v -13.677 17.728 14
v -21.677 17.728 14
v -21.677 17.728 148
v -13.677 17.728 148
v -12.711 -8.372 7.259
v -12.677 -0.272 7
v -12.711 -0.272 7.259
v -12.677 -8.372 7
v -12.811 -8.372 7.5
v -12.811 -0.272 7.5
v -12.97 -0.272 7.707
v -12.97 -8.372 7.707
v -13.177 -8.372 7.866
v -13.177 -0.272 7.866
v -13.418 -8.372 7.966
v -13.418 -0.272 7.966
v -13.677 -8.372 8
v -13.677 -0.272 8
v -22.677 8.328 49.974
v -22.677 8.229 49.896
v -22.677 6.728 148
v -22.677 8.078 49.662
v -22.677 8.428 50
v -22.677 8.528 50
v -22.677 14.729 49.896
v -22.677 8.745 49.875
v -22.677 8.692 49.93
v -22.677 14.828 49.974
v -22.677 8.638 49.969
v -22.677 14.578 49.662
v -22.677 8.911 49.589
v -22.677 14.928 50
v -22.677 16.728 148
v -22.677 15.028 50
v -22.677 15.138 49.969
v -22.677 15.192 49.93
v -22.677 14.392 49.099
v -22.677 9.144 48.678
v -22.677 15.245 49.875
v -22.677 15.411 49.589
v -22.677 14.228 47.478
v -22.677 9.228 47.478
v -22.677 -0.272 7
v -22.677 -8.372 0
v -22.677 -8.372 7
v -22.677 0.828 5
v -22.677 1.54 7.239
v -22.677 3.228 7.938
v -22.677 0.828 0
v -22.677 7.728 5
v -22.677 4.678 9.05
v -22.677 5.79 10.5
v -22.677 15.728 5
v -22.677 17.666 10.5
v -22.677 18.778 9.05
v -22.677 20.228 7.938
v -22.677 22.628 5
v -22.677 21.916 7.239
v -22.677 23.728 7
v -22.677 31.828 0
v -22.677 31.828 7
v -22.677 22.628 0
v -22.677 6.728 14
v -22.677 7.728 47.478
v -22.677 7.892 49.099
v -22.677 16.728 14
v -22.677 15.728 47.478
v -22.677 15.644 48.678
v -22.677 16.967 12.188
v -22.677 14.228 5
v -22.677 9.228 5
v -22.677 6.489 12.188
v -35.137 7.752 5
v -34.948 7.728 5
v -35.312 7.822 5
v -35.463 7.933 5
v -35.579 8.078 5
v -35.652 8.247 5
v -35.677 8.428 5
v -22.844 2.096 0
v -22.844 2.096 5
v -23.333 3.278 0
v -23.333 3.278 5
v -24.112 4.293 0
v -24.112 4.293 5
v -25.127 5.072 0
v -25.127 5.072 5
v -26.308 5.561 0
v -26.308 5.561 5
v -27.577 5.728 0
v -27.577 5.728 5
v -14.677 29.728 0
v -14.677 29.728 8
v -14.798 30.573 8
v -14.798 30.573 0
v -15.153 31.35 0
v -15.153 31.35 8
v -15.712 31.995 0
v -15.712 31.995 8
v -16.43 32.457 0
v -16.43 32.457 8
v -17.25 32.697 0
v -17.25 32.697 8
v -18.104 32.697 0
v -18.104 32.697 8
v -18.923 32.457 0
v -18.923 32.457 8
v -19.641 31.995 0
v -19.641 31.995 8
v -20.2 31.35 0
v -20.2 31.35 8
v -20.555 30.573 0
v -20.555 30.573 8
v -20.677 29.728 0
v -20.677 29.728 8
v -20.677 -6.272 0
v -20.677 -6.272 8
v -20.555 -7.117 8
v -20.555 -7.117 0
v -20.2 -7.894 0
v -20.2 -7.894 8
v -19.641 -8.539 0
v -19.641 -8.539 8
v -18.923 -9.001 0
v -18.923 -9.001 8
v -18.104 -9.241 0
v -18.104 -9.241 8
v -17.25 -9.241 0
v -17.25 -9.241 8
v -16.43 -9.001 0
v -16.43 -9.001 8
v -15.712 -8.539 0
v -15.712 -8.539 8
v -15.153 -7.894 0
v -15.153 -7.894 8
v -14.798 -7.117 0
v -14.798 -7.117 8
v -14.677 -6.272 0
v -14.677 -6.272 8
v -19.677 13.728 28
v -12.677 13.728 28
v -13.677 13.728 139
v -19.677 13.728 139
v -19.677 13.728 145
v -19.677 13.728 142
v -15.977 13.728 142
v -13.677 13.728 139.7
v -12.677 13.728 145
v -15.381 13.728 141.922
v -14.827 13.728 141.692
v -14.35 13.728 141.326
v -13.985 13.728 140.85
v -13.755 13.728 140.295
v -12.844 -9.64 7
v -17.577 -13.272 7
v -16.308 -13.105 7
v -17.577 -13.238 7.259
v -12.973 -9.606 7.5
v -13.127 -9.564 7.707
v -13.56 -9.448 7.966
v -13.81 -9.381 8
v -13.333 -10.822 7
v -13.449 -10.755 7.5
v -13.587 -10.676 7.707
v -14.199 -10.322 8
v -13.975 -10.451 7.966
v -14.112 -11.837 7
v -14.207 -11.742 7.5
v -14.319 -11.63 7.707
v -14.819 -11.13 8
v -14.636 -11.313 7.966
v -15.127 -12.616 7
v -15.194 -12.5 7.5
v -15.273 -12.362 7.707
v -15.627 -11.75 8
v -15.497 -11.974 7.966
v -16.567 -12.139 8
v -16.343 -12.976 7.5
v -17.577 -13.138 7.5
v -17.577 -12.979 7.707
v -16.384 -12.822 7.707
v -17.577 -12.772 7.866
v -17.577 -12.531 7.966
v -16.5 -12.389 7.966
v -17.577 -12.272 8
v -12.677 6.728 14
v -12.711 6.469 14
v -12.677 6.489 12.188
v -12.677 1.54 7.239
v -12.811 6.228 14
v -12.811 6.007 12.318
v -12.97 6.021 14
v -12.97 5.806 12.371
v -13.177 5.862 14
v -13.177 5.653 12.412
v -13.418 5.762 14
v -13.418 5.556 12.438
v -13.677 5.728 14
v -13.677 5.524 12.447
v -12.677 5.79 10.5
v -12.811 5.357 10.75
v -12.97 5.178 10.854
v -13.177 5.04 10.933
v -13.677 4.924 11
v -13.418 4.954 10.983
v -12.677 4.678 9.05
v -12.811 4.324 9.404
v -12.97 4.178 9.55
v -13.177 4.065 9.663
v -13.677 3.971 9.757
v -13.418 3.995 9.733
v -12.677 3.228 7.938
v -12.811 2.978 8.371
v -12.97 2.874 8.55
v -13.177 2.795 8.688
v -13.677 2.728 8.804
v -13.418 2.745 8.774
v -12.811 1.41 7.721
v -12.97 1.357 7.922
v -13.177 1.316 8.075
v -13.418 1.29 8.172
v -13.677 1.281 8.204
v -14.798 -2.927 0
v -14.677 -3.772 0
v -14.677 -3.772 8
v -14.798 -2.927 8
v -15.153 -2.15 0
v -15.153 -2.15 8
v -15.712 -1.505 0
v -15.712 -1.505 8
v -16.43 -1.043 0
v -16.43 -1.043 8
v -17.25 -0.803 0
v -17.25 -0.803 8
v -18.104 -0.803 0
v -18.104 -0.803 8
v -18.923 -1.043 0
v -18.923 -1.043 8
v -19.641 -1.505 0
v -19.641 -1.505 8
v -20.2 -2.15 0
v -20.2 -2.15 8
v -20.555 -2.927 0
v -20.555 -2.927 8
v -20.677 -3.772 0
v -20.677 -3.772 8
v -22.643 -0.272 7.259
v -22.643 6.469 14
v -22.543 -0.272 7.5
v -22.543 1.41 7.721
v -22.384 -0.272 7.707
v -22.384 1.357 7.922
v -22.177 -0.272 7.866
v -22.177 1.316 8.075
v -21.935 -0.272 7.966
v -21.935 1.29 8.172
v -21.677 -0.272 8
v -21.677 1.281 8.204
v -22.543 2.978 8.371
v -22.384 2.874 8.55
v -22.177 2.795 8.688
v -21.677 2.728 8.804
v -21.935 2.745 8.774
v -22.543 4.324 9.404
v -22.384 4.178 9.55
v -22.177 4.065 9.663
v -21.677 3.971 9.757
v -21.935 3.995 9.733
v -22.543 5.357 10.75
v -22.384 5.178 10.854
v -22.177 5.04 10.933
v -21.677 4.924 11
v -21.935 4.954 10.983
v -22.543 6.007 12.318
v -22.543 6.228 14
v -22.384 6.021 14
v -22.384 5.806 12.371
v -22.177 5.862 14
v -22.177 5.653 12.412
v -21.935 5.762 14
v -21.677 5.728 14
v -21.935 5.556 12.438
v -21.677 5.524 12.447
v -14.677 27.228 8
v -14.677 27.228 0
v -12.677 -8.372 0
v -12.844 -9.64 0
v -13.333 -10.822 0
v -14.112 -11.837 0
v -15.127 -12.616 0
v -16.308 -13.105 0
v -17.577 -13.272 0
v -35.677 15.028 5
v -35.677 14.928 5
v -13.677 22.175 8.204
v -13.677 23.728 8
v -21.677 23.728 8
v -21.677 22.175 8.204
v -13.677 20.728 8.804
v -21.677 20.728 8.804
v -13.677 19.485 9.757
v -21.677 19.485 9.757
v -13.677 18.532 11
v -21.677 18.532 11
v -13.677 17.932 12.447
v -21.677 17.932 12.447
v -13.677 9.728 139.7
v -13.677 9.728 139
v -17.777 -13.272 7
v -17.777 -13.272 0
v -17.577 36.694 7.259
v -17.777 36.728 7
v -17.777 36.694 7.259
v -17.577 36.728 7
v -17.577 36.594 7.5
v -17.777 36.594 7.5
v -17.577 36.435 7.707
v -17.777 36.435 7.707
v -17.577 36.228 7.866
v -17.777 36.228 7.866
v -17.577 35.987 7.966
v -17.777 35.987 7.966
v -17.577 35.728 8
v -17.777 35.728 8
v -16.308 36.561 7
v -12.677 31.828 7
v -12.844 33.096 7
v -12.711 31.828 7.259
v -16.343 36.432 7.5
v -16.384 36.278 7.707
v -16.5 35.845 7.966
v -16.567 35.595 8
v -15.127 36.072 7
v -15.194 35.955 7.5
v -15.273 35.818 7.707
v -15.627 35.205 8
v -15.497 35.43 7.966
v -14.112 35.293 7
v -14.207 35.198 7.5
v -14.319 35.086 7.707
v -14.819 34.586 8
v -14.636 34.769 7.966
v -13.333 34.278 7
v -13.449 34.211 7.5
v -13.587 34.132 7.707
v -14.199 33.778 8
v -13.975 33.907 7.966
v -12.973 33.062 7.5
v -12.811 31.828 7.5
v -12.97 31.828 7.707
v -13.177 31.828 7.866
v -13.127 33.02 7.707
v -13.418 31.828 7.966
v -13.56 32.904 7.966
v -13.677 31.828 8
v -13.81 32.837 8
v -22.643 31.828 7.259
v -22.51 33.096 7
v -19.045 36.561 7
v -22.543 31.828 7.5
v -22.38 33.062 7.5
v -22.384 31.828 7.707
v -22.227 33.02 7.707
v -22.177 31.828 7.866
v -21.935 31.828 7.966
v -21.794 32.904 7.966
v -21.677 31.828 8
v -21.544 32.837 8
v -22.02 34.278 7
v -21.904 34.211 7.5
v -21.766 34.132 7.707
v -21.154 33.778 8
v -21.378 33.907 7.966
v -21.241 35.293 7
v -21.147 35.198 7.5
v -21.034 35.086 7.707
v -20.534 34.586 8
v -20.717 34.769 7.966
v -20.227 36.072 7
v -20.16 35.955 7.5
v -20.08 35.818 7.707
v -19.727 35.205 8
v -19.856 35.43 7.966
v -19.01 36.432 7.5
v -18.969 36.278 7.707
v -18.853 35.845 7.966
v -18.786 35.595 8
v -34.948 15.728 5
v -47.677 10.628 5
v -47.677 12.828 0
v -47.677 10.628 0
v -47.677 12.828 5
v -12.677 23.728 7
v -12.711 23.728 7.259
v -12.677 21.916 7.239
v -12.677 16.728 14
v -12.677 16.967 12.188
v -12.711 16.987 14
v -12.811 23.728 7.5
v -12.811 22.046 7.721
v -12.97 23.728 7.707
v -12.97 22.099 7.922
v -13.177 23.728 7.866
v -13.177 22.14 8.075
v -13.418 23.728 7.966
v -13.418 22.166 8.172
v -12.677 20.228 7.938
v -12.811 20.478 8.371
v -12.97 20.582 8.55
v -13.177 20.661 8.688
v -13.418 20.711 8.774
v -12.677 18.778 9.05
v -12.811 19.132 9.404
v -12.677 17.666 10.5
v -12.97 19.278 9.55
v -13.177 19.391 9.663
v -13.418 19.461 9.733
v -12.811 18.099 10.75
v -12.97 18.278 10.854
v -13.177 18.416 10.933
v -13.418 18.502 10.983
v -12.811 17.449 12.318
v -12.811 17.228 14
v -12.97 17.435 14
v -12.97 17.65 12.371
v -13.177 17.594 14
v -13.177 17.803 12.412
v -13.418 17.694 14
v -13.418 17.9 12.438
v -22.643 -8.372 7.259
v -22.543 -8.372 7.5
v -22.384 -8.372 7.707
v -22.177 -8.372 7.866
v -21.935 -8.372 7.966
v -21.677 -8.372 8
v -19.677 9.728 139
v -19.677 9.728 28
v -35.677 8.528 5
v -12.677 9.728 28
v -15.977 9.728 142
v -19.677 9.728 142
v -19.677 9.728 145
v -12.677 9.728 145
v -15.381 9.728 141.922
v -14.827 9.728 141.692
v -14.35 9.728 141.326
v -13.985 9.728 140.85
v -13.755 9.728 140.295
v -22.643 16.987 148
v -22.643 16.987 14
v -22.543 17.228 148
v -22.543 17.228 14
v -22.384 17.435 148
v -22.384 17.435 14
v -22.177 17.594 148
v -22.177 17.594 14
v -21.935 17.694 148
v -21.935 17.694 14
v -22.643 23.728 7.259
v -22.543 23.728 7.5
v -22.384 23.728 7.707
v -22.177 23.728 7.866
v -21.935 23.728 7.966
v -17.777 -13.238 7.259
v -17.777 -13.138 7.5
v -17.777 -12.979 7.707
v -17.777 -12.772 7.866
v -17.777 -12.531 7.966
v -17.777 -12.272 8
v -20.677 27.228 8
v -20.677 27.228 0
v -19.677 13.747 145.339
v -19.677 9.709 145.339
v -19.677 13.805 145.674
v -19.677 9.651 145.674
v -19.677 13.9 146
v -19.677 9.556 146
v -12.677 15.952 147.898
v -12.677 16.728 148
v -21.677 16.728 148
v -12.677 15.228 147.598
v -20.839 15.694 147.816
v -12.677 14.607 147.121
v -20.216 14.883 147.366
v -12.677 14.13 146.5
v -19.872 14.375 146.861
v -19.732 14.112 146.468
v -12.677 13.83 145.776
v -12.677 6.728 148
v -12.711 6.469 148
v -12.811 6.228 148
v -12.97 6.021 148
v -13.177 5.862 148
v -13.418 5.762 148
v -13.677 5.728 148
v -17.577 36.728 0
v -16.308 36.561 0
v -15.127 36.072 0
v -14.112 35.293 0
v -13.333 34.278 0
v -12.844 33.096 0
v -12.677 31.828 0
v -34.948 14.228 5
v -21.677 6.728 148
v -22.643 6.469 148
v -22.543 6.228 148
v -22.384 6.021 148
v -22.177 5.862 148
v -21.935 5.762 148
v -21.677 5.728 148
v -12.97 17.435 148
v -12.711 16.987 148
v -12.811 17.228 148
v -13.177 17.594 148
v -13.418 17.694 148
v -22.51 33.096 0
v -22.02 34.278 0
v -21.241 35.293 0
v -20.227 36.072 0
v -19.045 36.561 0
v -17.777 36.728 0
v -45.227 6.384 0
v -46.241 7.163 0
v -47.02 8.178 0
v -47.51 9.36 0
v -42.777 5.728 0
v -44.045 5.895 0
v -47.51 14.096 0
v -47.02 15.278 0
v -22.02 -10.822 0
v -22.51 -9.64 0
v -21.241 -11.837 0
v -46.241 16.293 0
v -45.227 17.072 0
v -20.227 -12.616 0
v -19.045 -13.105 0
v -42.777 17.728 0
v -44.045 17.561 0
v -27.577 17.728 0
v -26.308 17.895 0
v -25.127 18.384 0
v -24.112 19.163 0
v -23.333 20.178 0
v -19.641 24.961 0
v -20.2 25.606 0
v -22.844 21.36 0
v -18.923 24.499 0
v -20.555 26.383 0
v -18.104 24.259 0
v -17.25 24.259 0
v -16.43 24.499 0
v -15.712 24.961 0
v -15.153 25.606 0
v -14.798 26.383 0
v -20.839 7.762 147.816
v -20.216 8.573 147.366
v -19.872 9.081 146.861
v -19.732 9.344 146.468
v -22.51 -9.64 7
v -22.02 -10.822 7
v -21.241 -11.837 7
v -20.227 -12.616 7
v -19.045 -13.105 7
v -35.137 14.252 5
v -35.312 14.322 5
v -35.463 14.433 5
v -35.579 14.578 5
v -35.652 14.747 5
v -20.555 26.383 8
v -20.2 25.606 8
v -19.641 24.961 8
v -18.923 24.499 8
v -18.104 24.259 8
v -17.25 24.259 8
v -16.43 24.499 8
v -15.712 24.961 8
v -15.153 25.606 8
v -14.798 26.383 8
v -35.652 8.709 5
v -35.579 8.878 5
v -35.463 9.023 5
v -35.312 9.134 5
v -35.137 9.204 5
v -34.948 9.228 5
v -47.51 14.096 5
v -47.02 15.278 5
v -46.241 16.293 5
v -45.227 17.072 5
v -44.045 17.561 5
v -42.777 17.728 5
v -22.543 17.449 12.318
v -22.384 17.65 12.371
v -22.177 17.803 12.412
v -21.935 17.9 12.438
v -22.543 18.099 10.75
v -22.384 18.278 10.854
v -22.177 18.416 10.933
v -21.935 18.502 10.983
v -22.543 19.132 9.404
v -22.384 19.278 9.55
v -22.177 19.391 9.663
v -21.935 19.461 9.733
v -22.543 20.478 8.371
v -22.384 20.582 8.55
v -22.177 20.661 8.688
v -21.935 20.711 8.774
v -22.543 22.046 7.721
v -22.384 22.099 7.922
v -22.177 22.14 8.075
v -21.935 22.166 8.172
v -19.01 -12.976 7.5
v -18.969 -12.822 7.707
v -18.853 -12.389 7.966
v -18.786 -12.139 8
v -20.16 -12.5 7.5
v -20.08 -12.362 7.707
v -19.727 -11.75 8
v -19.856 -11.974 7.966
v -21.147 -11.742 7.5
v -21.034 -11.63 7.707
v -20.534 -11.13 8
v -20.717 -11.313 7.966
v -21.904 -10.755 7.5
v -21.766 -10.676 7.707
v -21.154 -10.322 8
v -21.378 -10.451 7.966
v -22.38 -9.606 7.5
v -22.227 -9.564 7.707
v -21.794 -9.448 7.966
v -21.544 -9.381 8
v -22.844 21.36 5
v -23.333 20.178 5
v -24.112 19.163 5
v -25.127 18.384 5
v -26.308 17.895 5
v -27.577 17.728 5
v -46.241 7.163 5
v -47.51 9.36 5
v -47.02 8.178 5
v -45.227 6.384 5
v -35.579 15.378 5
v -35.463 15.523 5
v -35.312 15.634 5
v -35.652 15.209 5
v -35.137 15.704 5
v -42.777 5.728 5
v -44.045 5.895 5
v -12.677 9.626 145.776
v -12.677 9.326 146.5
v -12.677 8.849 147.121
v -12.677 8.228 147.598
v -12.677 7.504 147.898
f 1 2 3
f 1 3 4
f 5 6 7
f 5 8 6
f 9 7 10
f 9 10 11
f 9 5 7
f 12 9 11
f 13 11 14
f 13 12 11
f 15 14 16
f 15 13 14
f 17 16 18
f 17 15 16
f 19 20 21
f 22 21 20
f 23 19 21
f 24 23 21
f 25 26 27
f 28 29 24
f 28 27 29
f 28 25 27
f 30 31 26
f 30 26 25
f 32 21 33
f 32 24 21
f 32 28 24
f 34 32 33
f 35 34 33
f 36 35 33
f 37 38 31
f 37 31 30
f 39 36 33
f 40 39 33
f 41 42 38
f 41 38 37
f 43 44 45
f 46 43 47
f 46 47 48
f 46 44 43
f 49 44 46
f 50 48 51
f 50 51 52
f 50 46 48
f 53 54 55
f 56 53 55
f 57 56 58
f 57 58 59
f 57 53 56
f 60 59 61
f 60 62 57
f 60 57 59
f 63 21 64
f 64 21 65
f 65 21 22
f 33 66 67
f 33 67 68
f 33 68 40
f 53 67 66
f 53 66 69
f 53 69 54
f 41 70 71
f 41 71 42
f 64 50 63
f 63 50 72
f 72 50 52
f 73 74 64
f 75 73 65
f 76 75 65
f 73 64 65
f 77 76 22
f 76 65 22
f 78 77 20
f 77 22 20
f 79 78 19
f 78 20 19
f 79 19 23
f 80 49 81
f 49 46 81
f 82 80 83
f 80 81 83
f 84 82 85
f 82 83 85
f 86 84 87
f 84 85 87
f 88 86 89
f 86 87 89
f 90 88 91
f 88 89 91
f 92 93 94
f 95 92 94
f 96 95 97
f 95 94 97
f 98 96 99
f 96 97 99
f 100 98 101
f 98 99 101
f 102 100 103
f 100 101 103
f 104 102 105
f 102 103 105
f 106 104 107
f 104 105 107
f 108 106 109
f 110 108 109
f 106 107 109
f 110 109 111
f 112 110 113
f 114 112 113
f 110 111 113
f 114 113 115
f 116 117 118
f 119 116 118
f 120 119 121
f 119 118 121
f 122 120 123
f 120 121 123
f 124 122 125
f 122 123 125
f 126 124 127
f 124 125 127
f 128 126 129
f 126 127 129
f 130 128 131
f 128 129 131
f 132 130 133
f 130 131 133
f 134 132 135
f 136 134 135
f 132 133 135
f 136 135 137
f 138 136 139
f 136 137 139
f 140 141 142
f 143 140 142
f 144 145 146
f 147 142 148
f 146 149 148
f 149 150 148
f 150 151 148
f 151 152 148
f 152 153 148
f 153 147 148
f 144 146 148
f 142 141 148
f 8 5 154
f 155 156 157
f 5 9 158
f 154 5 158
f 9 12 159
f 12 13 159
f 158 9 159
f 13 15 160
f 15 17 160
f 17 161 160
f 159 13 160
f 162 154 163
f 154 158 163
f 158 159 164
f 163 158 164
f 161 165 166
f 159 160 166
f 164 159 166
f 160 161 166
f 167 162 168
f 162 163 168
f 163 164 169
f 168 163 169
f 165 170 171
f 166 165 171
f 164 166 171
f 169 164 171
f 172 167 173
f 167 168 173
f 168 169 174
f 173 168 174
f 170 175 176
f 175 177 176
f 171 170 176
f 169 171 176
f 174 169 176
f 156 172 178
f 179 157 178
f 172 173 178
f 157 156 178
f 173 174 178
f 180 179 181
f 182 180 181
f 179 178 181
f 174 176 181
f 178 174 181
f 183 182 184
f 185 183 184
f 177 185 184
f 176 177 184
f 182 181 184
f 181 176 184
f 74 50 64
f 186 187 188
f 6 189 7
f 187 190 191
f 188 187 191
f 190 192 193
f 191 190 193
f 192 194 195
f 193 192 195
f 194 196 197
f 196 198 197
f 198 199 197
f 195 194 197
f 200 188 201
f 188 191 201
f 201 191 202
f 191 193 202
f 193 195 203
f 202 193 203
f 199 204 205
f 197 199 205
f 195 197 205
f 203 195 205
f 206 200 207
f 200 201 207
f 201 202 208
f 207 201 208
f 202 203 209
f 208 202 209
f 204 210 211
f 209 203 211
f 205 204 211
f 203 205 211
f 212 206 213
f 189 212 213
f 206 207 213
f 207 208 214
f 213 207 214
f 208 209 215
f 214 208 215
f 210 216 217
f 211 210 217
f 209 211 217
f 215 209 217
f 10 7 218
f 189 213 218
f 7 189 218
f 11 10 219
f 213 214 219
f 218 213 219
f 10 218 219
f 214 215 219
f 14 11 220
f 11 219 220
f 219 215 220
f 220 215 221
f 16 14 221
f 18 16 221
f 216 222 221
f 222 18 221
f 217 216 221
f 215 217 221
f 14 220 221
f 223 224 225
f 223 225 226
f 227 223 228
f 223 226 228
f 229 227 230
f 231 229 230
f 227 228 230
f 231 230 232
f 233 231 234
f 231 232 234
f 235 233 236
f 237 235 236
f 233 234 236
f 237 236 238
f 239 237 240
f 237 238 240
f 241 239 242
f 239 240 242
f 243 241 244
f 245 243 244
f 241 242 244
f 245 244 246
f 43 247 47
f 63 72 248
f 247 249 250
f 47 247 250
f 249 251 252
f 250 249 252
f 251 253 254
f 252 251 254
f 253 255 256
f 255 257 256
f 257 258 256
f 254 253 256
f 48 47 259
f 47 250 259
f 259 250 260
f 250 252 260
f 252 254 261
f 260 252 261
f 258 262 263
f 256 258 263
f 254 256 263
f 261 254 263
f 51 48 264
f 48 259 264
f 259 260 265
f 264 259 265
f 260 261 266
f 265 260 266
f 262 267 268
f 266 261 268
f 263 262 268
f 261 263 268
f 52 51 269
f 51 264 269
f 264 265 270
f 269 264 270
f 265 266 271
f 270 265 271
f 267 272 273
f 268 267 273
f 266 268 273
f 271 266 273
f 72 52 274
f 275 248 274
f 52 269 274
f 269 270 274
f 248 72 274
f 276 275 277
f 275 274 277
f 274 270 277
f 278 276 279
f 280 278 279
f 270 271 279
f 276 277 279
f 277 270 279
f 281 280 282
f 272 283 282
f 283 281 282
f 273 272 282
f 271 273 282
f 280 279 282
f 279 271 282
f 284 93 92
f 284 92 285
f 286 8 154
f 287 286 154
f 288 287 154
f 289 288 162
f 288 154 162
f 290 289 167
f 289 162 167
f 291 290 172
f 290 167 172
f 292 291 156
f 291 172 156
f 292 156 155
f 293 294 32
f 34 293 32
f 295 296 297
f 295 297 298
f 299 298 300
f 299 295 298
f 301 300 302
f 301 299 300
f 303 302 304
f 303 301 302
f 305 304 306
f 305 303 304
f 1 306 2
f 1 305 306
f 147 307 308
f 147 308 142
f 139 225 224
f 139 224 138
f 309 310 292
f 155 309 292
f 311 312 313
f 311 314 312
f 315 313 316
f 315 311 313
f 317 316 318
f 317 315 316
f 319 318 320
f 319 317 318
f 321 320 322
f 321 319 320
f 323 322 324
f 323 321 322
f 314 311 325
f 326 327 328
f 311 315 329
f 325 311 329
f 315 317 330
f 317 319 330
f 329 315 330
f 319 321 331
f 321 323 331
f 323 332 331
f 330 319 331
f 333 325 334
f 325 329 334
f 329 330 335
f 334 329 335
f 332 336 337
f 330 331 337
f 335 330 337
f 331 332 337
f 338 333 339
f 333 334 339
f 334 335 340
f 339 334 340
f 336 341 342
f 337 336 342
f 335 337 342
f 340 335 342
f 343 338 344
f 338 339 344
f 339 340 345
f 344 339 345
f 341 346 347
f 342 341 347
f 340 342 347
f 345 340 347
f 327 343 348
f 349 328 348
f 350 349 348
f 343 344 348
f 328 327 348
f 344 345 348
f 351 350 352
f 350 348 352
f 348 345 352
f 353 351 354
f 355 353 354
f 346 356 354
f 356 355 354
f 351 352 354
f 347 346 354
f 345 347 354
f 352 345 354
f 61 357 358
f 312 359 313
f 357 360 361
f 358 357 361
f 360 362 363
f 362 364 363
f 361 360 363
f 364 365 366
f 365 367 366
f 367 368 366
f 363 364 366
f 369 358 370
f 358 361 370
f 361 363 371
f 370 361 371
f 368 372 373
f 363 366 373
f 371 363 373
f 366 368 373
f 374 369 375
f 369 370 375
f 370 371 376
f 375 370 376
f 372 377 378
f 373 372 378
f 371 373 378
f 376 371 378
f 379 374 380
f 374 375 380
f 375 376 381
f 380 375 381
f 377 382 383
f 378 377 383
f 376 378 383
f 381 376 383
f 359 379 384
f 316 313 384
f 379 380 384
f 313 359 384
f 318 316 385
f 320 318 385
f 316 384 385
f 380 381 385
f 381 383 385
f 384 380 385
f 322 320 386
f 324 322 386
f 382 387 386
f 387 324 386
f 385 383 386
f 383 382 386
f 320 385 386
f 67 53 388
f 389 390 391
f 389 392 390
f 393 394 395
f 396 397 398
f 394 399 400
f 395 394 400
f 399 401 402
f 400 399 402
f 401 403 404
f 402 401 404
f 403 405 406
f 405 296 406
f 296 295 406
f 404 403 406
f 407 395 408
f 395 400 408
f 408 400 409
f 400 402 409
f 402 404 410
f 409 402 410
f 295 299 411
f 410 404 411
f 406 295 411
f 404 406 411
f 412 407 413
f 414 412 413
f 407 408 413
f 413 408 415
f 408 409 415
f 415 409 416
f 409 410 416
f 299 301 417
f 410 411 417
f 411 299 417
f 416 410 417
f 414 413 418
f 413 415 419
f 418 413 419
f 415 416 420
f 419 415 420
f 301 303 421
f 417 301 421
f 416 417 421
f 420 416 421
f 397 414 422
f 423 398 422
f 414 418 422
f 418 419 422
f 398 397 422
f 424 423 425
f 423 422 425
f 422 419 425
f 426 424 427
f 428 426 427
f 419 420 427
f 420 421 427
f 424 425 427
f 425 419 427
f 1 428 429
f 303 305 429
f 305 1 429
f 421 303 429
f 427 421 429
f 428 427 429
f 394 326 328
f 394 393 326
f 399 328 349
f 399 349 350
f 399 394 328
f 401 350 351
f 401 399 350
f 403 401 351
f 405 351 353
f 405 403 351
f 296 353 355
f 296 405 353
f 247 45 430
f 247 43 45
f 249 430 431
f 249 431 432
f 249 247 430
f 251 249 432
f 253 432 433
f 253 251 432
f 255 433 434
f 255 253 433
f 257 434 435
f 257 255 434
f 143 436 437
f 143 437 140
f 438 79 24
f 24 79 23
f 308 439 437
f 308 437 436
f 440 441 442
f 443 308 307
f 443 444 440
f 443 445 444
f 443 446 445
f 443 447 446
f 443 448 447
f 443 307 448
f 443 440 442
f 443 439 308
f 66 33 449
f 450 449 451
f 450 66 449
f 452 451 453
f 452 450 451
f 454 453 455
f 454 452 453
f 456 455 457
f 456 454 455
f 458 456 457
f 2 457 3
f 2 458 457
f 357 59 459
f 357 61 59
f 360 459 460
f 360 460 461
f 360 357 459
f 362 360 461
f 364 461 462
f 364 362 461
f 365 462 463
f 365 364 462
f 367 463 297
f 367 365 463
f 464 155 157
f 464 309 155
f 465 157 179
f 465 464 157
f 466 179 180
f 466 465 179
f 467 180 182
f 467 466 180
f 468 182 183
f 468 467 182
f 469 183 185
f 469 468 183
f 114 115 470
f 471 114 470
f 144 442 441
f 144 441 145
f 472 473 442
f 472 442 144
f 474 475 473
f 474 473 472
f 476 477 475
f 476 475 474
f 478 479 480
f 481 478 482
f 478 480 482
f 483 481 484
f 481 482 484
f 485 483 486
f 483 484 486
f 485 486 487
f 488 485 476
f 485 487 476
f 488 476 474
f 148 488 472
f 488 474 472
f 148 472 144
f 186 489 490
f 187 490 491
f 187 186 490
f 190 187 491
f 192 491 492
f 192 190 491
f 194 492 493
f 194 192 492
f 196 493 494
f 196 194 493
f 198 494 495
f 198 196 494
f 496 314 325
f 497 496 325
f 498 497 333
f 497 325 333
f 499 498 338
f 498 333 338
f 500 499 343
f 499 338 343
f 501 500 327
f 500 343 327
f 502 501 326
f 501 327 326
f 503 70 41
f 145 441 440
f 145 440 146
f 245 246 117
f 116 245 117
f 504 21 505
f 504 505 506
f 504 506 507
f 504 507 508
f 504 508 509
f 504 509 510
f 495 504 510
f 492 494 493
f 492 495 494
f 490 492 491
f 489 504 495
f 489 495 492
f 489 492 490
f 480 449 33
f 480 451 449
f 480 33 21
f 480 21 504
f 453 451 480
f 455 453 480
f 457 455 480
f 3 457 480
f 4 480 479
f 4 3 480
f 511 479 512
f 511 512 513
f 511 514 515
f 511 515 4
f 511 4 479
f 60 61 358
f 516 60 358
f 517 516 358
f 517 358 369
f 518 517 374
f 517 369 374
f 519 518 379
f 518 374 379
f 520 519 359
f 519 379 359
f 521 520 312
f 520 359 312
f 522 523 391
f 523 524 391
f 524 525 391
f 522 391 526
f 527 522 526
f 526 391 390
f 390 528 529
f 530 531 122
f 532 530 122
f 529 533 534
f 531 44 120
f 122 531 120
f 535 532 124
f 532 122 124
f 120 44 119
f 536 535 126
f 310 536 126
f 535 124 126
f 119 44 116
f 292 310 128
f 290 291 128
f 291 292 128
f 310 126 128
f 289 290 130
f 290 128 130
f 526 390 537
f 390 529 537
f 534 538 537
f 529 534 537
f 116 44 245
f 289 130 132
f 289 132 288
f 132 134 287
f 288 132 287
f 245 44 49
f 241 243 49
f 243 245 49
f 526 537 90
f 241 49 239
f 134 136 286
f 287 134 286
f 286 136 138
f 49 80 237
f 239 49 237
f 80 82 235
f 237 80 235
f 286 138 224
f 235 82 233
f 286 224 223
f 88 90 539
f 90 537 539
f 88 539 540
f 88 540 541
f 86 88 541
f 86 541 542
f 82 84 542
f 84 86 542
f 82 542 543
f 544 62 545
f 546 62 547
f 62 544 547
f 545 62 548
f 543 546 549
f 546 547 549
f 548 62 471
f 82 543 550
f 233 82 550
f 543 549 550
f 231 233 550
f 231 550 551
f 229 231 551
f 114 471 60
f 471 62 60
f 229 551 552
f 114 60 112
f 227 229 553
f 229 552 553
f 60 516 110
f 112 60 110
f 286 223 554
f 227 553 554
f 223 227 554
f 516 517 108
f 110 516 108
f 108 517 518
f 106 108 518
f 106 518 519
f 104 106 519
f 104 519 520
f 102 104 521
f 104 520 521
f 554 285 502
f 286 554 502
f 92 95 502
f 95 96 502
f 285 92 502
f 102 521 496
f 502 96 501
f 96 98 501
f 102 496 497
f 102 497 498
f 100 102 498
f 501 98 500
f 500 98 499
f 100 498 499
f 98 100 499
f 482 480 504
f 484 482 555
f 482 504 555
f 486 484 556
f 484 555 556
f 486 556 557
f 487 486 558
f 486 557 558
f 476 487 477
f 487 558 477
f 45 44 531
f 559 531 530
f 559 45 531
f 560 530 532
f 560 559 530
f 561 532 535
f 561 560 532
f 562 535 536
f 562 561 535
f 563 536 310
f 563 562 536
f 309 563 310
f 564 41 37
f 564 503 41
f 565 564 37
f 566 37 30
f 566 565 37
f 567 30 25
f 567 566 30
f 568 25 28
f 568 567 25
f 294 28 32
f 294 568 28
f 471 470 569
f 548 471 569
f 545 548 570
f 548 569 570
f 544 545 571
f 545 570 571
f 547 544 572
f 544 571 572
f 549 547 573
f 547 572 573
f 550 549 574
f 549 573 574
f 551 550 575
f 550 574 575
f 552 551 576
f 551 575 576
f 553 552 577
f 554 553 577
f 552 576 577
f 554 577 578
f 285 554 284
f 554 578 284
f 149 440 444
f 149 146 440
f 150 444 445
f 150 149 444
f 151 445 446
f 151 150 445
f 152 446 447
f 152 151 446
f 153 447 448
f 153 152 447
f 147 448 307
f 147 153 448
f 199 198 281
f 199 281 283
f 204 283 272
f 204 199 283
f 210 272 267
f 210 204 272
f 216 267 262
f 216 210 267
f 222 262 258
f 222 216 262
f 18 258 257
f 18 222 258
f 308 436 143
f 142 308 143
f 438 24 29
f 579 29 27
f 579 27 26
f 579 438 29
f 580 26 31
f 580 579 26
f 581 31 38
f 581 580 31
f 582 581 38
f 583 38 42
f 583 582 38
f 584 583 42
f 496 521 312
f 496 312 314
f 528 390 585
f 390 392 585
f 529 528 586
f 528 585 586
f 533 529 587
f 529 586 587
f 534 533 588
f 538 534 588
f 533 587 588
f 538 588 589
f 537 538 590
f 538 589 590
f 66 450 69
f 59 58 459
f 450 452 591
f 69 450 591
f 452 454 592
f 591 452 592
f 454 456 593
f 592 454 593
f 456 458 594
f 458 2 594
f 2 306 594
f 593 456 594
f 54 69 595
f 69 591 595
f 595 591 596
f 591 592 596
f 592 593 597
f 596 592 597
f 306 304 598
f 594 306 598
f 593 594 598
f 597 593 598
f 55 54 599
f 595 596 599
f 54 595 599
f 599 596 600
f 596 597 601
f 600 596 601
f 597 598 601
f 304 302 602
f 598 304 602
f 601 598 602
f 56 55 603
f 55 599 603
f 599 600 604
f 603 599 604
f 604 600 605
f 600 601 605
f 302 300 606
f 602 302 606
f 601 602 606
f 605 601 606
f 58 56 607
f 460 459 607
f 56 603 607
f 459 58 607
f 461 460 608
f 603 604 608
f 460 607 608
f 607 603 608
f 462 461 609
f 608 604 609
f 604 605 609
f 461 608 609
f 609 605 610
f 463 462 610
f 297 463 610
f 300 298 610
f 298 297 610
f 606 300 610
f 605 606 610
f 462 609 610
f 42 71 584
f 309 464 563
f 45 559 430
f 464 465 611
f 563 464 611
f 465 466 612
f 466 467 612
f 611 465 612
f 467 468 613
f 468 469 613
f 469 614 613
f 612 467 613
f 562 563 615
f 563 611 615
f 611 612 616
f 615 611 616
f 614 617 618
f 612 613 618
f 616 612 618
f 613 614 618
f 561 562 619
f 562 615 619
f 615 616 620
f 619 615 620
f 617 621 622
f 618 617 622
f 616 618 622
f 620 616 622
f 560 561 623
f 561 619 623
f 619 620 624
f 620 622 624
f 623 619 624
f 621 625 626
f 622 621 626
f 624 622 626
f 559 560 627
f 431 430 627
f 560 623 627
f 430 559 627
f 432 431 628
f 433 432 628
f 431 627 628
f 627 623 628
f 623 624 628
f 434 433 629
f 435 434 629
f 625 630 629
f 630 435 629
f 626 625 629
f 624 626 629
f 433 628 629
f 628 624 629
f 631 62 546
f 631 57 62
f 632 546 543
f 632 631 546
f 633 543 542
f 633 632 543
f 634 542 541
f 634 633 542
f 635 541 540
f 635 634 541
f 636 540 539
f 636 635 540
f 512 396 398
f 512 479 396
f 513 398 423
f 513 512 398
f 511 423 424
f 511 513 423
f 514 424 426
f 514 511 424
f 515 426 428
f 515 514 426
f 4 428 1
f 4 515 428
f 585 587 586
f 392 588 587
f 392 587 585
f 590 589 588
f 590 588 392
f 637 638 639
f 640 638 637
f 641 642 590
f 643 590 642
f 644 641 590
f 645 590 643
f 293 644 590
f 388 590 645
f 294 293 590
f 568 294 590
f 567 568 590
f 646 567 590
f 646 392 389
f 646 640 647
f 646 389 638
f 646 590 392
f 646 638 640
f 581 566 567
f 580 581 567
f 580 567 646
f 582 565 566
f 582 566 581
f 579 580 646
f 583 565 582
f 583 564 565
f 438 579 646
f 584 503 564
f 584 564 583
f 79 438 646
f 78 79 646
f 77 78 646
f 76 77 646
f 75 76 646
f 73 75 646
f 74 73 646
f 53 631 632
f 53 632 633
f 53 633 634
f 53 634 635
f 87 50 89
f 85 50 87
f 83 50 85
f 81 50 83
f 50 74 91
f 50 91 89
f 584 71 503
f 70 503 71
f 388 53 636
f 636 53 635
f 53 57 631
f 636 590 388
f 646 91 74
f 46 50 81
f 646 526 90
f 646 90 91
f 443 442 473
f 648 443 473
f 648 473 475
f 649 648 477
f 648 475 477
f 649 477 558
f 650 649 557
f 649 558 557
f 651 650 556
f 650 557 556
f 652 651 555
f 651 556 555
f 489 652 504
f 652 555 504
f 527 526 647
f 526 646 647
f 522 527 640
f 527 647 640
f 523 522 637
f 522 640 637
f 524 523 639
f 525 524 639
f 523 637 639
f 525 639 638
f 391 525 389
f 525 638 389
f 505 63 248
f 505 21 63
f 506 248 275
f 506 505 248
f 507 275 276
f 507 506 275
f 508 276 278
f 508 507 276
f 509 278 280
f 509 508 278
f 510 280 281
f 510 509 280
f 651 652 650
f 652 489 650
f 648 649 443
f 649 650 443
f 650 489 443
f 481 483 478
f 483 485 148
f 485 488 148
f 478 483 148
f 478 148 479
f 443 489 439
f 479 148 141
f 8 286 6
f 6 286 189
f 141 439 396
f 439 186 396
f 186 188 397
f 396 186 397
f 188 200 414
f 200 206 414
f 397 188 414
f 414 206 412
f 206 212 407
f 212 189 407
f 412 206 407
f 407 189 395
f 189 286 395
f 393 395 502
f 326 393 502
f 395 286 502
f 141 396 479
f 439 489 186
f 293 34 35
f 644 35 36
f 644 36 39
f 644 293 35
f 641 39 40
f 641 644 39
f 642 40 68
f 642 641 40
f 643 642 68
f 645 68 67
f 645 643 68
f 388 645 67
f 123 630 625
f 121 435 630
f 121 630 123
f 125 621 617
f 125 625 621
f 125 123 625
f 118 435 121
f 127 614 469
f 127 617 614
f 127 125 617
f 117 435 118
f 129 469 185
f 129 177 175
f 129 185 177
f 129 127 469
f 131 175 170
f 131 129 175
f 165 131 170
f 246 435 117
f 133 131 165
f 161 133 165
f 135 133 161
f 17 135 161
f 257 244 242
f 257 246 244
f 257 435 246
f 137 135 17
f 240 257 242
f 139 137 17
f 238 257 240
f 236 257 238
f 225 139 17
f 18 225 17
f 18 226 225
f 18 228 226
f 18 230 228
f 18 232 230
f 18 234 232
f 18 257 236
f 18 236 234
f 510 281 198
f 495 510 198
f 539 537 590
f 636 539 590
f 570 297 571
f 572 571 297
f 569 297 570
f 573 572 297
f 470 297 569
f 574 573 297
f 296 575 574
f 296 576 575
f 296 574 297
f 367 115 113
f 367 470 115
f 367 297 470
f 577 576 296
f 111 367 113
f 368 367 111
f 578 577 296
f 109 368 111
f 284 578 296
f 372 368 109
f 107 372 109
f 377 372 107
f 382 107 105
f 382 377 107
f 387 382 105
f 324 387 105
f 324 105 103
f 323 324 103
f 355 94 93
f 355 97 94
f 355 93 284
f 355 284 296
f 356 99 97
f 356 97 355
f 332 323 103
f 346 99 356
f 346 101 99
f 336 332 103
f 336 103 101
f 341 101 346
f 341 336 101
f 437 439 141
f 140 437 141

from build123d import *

# Parameters (mm, degrees)
SKETCH_W        = 10
SKETCH_H        = 50
PAD_DEPTH       = 8
SKETCH001_W     = 10
SKETCH001_H     = 12
PAD001_DEPTH    = 140
SKETCH002_W     = 4
SKETCH002_H     = 120
POCKET_DEPTH    = 7
POCKET001_DEPTH = 8.001
SKETCH004_W     = 12
SKETCH004_H     = 5
PAD002_DEPTH    = 25
SKETCH005_W     = 1.5
SKETCH005_H     = 45
PAD003_DEPTH    = 13
POCKET002_DEPTH = 29.001
FILLET_R        = 4.9
FILLET001_R     = 6
FILLET002_R     = 0.7
FILLET003_R     = 1
SKETCH007_W     = 4
SKETCH007_H     = 3
PAD004_DEPTH    = 6
FILLET004_R     = 2.3
FILLET005_R     = 3
FILLET006_R     = 2


with BuildPart() as part:
    # Sketch → Pad (new body)
    with BuildSketch(Plane.XY):
        with Locations((-17.676624, 11.727997)):
            Rectangle(SKETCH_W, SKETCH_H)
    extrude(amount=PAD_DEPTH)

    # Sketch001 (on Face6 of Pad) → Pad001 (join)
    with BuildSketch(Plane.XY.offset(8)):
        with Locations((-17.676624, 11.727997)):
            Rectangle(SKETCH001_W, SKETCH001_H)
    extrude(amount=PAD001_DEPTH)

    # Sketch002 (on Face9 of Pad001) → Pocket (cut)
    with BuildSketch(Plane.YZ.offset(-12.676624)):
        with Locations((11.727997, 88)):
            Rectangle(SKETCH002_W, SKETCH002_H)
    extrude(amount=-POCKET_DEPTH, mode=Mode.SUBTRACT)

    # Sketch003 (on Face7 of Pocket) → Pocket001 (cut, through all)
    with BuildSketch(Plane.XY.offset(8)):
        with BuildLine():
            ThreePointArc((-14.676624, -3.772003), (-17.676624, -0.772003), (-20.676624, -3.772003))
            Line((-20.676624, -3.772003), (-20.676624, -6.272003))
            ThreePointArc((-20.676624, -6.272003), (-17.676624, -9.272003), (-14.676624, -6.272003))
            Line((-14.676624, -3.772003), (-14.676624, -6.272003))
        make_face()
        with BuildLine():
            ThreePointArc((-14.676624, 29.727997), (-17.676624, 32.727997), (-20.676624, 29.727997))
            Line((-20.676624, 29.727997), (-20.676624, 27.227997))
            ThreePointArc((-20.676624, 27.227997), (-17.676624, 24.227997), (-14.676624, 27.227997))
            Line((-14.676624, 29.727997), (-14.676624, 27.227997))
        make_face()
    extrude(amount=-POCKET001_DEPTH, mode=Mode.SUBTRACT)

    # Sketch004 (on Face2 of Pocket001) → Pad002 (join)
    with BuildSketch(Plane(origin=(-22.676624, 0, 0), x_dir=(0, -1, 0), z_dir=(-1, 0, 0))):
        with Locations((-11.727997, 2.5)):
            Rectangle(SKETCH004_W, SKETCH004_H)
    extrude(amount=PAD002_DEPTH)

    # Sketch005 (on Face9 of Pad002) → Pad003 (join)
    with BuildSketch(Plane(origin=(-22.676624, 0, 0), x_dir=(0, -1, 0), z_dir=(-1, 0, 0))):
        with Locations((-8.477997, 27.5)):
            Rectangle(SKETCH005_W, SKETCH005_H)
        with Locations((-14.977997, 27.5)):
            Rectangle(SKETCH005_W, SKETCH005_H)
    extrude(amount=PAD003_DEPTH)

    # Sketch006 (on Face29 of Pad003) → Pocket002 (cut, through all)
    with BuildSketch(Plane.XZ.offset(-7.727997)):
        Polygon((-35.676624, 5), (-22.676624, 50), (-35.676624, 50), align=None)
    extrude(amount=-POCKET002_DEPTH, mode=Mode.SUBTRACT)

    # Fillet
    fillet_edges = [part.edges().sort_by_distance(p)[0] for p in [
        (-12.676624, 36.727997, 4),
        (-22.676624, 36.727997, 4),
        (-22.676624, 17.727997, 2.5),
        (-47.676624, 17.727997, 2.5),
        (-47.676624, 5.727997, 2.5),
        (-22.676624, 5.727997, 2.5),
        (-22.676624, -13.272003, 4),
        (-12.676624, -13.272003, 4),
    ]]
    fillet(fillet_edges, radius=FILLET_R)

    # Fillet001
    fillet001_edges = [part.edges().sort_by_distance(p)[0] for p in [
        (-17.676624, 5.727997, 8),
        (-17.676624, 17.727997, 8),
    ]]
    fillet(fillet001_edges, radius=FILLET001_R)

    # Fillet002
    fillet002_edges = [part.edges().sort_by_distance(p)[0] for p in [
        (-29.176624, 7.727997, 27.5),
        (-29.176624, 9.227997, 27.5),
        (-29.176624, 14.227997, 27.5),
        (-29.176624, 15.727997, 27.5),
    ]]
    fillet(fillet002_edges, radius=FILLET002_R)

    # Fillet003
    fillet003_edges = [part.edges().sort_by_distance(p)[0] for p in [
        (-22.676624, 5.727997, 81),
        (-22.676624, 17.727997, 99),
    ]]
    fillet(fillet003_edges, radius=FILLET003_R)

    # Sketch007 (on Face57 of Fillet003) → Pad004 (join)
    with BuildSketch(Plane.YZ.offset(-19.676624)):
        with Locations((11.727997, 140.5)):
            Rectangle(SKETCH007_W, SKETCH007_H)
    extrude(amount=PAD004_DEPTH)

    # Fillet004
    fillet004_edges = [part.edges().sort_by_distance(p)[0] for p in [
        (-13.676624, 11.727997, 142),
    ]]
    fillet(fillet004_edges, radius=FILLET004_R)

    # Fillet005
    fillet005_edges = [part.edges().sort_by_distance(p)[0] for p in [
        (-16.176624, 9.727997, 148),
        (-16.176624, 13.727997, 148),
    ]]
    fillet(fillet005_edges, radius=FILLET005_R)

    # Fillet006
    fillet006_edges = [part.edges().sort_by_distance(p)[0] for p in [
        (-19.676624, 11.727997, 148),
    ]]
    fillet(fillet006_edges, radius=FILLET006_R)


solid = part.part
